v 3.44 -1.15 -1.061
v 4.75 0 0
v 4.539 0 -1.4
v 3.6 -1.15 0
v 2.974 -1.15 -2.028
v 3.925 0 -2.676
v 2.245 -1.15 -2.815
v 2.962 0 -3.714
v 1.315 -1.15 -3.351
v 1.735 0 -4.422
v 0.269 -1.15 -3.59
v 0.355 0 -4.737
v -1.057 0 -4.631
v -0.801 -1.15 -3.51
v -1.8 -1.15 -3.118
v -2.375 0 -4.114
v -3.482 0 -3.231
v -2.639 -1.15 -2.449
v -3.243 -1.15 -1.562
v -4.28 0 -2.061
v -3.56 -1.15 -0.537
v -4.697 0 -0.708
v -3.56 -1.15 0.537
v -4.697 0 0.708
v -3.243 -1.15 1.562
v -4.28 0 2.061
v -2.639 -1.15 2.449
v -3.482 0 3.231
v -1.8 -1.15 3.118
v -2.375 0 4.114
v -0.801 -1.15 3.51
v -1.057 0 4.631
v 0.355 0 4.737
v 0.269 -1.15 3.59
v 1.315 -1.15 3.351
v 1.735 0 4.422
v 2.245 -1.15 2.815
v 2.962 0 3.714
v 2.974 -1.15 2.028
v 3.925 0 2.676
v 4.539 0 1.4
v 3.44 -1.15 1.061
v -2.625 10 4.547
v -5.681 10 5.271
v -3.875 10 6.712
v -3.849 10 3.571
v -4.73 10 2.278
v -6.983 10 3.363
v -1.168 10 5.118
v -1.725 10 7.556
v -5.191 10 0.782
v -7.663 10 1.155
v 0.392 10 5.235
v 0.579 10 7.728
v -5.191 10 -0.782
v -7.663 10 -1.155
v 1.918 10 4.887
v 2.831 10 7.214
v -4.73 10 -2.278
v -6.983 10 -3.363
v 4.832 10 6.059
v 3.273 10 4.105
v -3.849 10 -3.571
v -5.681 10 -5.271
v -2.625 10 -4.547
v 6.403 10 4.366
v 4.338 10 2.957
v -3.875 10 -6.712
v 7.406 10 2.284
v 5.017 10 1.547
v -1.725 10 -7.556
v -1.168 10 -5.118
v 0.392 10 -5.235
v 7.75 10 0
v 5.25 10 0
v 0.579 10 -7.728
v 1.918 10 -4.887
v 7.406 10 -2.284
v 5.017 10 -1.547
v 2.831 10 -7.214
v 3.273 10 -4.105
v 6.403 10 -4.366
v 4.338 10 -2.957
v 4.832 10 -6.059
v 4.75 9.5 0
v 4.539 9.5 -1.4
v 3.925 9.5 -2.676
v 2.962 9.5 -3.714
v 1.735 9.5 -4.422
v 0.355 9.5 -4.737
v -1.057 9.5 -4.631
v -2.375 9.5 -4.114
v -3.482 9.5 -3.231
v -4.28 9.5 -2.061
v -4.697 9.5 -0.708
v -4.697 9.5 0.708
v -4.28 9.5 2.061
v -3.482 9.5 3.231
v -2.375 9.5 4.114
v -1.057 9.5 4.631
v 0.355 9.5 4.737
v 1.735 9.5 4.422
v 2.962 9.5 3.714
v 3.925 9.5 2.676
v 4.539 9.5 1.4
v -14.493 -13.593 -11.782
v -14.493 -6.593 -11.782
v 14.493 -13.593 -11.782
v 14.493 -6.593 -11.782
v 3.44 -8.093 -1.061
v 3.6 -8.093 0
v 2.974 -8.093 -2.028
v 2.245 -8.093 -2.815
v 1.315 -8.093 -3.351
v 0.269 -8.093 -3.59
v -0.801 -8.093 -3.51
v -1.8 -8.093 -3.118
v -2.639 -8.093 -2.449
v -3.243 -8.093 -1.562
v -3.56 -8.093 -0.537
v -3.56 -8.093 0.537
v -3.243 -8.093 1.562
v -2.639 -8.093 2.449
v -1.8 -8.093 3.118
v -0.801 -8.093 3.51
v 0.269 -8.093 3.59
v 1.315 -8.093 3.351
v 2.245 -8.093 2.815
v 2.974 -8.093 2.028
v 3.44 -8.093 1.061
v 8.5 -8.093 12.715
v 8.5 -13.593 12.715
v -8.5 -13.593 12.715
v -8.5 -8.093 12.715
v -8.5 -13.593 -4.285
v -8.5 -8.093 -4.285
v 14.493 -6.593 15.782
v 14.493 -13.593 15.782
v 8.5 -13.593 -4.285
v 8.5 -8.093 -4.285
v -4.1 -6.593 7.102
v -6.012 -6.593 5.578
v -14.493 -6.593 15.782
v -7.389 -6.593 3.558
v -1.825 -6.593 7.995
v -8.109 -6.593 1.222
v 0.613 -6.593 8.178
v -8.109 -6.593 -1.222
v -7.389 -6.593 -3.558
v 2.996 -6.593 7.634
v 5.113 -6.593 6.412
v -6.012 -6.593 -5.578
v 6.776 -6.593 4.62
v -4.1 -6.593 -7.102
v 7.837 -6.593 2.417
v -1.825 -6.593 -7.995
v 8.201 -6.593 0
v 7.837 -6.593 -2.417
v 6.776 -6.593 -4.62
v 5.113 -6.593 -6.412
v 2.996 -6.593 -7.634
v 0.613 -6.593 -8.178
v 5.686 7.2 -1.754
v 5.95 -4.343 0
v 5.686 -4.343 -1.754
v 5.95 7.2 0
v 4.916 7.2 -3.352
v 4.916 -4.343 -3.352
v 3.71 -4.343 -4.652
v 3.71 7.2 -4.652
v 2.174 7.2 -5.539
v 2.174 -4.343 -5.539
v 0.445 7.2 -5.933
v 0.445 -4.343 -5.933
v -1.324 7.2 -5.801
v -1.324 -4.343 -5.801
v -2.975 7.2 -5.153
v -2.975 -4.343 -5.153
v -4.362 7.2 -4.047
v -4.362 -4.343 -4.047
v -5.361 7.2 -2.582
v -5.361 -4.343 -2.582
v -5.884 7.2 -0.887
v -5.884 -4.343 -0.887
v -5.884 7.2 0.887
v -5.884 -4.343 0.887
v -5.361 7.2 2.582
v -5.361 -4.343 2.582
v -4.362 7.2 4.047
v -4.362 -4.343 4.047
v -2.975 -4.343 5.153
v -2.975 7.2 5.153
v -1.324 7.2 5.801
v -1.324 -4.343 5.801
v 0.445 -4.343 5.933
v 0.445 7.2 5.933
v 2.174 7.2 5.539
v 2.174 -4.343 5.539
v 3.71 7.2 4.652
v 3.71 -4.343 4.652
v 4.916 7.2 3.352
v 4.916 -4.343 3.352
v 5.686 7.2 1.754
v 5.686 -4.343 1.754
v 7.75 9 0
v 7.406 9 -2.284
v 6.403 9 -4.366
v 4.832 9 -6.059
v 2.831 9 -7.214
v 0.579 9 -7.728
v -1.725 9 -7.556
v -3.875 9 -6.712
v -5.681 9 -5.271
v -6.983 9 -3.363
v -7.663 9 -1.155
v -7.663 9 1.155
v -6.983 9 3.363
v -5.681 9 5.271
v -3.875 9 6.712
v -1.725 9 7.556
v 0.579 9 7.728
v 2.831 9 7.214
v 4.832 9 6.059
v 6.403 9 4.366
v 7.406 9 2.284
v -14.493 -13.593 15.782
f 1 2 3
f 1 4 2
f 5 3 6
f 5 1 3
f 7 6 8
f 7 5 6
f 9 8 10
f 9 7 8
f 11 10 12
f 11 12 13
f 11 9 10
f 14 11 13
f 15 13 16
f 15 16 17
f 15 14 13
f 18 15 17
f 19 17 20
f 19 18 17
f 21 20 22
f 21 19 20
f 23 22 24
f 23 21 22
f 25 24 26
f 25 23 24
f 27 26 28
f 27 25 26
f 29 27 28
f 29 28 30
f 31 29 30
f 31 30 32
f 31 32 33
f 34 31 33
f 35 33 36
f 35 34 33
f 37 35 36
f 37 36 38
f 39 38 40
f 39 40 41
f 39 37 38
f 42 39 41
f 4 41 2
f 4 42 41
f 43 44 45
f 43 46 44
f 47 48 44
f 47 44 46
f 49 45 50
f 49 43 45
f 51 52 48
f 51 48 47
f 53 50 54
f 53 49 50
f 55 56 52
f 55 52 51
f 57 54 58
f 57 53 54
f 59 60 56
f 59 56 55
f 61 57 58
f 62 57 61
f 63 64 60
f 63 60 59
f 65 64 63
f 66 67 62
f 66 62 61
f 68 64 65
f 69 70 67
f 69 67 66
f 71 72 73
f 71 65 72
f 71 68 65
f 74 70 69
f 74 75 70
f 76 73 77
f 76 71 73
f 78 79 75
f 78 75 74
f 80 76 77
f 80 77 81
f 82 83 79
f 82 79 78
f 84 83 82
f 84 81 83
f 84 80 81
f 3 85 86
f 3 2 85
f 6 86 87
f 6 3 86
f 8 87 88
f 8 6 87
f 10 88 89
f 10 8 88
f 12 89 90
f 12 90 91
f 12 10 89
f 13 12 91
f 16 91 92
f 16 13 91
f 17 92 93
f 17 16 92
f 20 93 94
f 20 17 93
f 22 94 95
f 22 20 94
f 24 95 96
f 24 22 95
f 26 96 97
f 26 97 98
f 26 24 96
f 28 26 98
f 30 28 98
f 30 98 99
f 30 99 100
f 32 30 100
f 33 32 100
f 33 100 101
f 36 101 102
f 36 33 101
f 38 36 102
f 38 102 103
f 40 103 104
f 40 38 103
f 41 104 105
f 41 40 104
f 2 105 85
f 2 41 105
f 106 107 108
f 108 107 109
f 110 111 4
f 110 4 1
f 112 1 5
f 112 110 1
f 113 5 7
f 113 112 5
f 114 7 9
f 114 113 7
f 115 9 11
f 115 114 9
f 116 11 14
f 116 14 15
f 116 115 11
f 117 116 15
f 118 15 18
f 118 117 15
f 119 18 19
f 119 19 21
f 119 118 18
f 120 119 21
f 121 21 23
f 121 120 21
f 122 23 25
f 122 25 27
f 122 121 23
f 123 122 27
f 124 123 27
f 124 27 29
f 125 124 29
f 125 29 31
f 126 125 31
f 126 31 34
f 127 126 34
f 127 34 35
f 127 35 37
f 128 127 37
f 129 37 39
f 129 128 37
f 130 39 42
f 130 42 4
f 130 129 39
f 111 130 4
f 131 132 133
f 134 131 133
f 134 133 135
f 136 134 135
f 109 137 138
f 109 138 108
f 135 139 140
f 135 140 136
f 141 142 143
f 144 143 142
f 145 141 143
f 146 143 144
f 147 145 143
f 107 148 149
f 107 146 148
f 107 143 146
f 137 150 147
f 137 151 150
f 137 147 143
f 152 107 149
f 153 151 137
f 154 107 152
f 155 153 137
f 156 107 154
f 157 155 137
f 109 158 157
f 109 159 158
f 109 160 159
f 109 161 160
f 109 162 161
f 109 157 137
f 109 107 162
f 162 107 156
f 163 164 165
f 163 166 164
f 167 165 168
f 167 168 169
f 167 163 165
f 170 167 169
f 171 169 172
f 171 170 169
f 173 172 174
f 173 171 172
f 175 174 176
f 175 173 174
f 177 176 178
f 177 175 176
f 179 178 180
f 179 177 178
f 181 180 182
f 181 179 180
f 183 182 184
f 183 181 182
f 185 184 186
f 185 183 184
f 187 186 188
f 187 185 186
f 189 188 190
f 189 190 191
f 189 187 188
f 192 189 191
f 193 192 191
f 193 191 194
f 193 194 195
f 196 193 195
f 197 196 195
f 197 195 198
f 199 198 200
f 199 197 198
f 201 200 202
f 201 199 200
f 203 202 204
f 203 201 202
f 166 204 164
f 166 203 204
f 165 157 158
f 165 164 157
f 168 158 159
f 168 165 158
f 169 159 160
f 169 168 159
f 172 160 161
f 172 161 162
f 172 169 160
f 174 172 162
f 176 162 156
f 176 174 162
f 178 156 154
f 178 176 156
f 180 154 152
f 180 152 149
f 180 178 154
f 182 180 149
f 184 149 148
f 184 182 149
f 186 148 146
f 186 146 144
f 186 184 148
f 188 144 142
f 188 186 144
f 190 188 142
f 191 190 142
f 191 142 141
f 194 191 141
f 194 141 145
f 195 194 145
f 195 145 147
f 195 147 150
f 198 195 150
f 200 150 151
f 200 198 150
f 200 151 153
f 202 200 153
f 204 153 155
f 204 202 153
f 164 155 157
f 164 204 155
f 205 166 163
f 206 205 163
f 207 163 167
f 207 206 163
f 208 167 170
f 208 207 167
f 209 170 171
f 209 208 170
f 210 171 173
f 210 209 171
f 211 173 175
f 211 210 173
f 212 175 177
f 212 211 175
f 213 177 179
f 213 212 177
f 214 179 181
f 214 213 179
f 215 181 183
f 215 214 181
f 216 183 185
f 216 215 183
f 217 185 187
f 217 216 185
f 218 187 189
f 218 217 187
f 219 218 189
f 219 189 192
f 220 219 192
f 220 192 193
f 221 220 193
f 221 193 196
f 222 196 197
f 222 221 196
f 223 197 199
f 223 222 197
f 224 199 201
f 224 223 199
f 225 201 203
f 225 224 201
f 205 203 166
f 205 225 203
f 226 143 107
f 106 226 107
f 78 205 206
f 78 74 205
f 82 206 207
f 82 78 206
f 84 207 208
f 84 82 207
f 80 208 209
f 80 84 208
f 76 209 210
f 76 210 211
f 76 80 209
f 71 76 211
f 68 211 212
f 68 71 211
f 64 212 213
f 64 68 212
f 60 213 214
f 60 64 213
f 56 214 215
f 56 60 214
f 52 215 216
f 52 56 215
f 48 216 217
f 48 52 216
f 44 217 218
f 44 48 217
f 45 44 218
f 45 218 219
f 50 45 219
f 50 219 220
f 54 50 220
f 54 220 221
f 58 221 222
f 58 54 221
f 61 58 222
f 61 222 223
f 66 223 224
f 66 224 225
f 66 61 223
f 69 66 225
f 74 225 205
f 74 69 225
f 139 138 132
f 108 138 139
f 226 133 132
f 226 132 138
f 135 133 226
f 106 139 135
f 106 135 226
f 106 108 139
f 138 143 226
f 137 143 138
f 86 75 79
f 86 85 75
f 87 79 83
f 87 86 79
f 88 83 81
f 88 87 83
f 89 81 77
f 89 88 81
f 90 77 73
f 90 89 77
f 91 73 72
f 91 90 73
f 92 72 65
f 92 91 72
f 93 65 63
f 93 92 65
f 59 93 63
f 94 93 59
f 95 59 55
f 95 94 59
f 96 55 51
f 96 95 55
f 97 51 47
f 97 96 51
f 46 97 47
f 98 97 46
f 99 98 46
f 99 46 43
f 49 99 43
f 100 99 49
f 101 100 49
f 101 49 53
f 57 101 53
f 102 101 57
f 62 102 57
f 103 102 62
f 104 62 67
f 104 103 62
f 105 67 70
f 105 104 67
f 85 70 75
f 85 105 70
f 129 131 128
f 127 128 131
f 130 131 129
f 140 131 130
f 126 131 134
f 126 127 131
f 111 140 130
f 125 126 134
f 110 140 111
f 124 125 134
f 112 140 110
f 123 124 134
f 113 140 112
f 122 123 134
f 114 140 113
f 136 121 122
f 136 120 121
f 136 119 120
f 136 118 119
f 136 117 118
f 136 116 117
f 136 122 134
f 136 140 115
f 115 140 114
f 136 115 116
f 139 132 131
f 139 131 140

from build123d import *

# Parameters (mm, degrees)
SKETCH2_OUTSIDE_W       = 59.31
SKETCH2_OUTSIDE_H       = 59.31
SKETCH2_OUTSIDE_W_2     = 28.986815524
SKETCH2_OUTSIDE_H_2     = 27.563826398
CUT_EXTRUDE1_DEPTH      = 11
CUT_EXTRUDE1_DEPTH_BACK = 14.593473012
SKETCH3_W               = 17
SKETCH3_H               = 17
CUT_EXTRUDE2_DEPTH      = 6.5


with BuildPart() as part:
    # Sketch1 → Revolve1 (revolve)
    with BuildSketch(Plane.XY):
        Polygon((4.75, 9.5), (4.75, 0), (3.6, -1.15), (3.6, -13.593473012), (22, -13.593473012), (22, -6.593473012), (8.200842899, -6.593473012), (5.95, -4.342630114), (5.95, 7.2), (7.75, 9), (7.75, 10), (5.25, 10), align=None)
    revolve(axis=Axis((0, -12.923275862, 0), (0, 1, 0)))

    # Sketch2 outside → Cut-Extrude1 (cut, two sides)
    with BuildSketch(Plane(origin=(0, 0, 0), x_dir=(1, 0, 0), z_dir=(0, 1, 0))) as cut_extrude1_sk:
        Rectangle(SKETCH2_OUTSIDE_W, SKETCH2_OUTSIDE_H)
        with Locations((0, -2)):
            Rectangle(SKETCH2_OUTSIDE_W_2, SKETCH2_OUTSIDE_H_2, mode=Mode.SUBTRACT)
    extrude(amount=CUT_EXTRUDE1_DEPTH, mode=Mode.SUBTRACT)
    extrude(cut_extrude1_sk.sketch, amount=-CUT_EXTRUDE1_DEPTH_BACK, mode=Mode.SUBTRACT)

    # Sketch3 → Cut-Extrude2 (cut)
    with BuildSketch(Plane(origin=(0, -14.593473012, 0), x_dir=(-1, 0, 0), z_dir=(0, -1, 0))):
        with Locations((0, -4.215)):
            Rectangle(SKETCH3_W, SKETCH3_H)
    extrude(amount=-CUT_EXTRUDE2_DEPTH, mode=Mode.SUBTRACT)


solid = part.part
